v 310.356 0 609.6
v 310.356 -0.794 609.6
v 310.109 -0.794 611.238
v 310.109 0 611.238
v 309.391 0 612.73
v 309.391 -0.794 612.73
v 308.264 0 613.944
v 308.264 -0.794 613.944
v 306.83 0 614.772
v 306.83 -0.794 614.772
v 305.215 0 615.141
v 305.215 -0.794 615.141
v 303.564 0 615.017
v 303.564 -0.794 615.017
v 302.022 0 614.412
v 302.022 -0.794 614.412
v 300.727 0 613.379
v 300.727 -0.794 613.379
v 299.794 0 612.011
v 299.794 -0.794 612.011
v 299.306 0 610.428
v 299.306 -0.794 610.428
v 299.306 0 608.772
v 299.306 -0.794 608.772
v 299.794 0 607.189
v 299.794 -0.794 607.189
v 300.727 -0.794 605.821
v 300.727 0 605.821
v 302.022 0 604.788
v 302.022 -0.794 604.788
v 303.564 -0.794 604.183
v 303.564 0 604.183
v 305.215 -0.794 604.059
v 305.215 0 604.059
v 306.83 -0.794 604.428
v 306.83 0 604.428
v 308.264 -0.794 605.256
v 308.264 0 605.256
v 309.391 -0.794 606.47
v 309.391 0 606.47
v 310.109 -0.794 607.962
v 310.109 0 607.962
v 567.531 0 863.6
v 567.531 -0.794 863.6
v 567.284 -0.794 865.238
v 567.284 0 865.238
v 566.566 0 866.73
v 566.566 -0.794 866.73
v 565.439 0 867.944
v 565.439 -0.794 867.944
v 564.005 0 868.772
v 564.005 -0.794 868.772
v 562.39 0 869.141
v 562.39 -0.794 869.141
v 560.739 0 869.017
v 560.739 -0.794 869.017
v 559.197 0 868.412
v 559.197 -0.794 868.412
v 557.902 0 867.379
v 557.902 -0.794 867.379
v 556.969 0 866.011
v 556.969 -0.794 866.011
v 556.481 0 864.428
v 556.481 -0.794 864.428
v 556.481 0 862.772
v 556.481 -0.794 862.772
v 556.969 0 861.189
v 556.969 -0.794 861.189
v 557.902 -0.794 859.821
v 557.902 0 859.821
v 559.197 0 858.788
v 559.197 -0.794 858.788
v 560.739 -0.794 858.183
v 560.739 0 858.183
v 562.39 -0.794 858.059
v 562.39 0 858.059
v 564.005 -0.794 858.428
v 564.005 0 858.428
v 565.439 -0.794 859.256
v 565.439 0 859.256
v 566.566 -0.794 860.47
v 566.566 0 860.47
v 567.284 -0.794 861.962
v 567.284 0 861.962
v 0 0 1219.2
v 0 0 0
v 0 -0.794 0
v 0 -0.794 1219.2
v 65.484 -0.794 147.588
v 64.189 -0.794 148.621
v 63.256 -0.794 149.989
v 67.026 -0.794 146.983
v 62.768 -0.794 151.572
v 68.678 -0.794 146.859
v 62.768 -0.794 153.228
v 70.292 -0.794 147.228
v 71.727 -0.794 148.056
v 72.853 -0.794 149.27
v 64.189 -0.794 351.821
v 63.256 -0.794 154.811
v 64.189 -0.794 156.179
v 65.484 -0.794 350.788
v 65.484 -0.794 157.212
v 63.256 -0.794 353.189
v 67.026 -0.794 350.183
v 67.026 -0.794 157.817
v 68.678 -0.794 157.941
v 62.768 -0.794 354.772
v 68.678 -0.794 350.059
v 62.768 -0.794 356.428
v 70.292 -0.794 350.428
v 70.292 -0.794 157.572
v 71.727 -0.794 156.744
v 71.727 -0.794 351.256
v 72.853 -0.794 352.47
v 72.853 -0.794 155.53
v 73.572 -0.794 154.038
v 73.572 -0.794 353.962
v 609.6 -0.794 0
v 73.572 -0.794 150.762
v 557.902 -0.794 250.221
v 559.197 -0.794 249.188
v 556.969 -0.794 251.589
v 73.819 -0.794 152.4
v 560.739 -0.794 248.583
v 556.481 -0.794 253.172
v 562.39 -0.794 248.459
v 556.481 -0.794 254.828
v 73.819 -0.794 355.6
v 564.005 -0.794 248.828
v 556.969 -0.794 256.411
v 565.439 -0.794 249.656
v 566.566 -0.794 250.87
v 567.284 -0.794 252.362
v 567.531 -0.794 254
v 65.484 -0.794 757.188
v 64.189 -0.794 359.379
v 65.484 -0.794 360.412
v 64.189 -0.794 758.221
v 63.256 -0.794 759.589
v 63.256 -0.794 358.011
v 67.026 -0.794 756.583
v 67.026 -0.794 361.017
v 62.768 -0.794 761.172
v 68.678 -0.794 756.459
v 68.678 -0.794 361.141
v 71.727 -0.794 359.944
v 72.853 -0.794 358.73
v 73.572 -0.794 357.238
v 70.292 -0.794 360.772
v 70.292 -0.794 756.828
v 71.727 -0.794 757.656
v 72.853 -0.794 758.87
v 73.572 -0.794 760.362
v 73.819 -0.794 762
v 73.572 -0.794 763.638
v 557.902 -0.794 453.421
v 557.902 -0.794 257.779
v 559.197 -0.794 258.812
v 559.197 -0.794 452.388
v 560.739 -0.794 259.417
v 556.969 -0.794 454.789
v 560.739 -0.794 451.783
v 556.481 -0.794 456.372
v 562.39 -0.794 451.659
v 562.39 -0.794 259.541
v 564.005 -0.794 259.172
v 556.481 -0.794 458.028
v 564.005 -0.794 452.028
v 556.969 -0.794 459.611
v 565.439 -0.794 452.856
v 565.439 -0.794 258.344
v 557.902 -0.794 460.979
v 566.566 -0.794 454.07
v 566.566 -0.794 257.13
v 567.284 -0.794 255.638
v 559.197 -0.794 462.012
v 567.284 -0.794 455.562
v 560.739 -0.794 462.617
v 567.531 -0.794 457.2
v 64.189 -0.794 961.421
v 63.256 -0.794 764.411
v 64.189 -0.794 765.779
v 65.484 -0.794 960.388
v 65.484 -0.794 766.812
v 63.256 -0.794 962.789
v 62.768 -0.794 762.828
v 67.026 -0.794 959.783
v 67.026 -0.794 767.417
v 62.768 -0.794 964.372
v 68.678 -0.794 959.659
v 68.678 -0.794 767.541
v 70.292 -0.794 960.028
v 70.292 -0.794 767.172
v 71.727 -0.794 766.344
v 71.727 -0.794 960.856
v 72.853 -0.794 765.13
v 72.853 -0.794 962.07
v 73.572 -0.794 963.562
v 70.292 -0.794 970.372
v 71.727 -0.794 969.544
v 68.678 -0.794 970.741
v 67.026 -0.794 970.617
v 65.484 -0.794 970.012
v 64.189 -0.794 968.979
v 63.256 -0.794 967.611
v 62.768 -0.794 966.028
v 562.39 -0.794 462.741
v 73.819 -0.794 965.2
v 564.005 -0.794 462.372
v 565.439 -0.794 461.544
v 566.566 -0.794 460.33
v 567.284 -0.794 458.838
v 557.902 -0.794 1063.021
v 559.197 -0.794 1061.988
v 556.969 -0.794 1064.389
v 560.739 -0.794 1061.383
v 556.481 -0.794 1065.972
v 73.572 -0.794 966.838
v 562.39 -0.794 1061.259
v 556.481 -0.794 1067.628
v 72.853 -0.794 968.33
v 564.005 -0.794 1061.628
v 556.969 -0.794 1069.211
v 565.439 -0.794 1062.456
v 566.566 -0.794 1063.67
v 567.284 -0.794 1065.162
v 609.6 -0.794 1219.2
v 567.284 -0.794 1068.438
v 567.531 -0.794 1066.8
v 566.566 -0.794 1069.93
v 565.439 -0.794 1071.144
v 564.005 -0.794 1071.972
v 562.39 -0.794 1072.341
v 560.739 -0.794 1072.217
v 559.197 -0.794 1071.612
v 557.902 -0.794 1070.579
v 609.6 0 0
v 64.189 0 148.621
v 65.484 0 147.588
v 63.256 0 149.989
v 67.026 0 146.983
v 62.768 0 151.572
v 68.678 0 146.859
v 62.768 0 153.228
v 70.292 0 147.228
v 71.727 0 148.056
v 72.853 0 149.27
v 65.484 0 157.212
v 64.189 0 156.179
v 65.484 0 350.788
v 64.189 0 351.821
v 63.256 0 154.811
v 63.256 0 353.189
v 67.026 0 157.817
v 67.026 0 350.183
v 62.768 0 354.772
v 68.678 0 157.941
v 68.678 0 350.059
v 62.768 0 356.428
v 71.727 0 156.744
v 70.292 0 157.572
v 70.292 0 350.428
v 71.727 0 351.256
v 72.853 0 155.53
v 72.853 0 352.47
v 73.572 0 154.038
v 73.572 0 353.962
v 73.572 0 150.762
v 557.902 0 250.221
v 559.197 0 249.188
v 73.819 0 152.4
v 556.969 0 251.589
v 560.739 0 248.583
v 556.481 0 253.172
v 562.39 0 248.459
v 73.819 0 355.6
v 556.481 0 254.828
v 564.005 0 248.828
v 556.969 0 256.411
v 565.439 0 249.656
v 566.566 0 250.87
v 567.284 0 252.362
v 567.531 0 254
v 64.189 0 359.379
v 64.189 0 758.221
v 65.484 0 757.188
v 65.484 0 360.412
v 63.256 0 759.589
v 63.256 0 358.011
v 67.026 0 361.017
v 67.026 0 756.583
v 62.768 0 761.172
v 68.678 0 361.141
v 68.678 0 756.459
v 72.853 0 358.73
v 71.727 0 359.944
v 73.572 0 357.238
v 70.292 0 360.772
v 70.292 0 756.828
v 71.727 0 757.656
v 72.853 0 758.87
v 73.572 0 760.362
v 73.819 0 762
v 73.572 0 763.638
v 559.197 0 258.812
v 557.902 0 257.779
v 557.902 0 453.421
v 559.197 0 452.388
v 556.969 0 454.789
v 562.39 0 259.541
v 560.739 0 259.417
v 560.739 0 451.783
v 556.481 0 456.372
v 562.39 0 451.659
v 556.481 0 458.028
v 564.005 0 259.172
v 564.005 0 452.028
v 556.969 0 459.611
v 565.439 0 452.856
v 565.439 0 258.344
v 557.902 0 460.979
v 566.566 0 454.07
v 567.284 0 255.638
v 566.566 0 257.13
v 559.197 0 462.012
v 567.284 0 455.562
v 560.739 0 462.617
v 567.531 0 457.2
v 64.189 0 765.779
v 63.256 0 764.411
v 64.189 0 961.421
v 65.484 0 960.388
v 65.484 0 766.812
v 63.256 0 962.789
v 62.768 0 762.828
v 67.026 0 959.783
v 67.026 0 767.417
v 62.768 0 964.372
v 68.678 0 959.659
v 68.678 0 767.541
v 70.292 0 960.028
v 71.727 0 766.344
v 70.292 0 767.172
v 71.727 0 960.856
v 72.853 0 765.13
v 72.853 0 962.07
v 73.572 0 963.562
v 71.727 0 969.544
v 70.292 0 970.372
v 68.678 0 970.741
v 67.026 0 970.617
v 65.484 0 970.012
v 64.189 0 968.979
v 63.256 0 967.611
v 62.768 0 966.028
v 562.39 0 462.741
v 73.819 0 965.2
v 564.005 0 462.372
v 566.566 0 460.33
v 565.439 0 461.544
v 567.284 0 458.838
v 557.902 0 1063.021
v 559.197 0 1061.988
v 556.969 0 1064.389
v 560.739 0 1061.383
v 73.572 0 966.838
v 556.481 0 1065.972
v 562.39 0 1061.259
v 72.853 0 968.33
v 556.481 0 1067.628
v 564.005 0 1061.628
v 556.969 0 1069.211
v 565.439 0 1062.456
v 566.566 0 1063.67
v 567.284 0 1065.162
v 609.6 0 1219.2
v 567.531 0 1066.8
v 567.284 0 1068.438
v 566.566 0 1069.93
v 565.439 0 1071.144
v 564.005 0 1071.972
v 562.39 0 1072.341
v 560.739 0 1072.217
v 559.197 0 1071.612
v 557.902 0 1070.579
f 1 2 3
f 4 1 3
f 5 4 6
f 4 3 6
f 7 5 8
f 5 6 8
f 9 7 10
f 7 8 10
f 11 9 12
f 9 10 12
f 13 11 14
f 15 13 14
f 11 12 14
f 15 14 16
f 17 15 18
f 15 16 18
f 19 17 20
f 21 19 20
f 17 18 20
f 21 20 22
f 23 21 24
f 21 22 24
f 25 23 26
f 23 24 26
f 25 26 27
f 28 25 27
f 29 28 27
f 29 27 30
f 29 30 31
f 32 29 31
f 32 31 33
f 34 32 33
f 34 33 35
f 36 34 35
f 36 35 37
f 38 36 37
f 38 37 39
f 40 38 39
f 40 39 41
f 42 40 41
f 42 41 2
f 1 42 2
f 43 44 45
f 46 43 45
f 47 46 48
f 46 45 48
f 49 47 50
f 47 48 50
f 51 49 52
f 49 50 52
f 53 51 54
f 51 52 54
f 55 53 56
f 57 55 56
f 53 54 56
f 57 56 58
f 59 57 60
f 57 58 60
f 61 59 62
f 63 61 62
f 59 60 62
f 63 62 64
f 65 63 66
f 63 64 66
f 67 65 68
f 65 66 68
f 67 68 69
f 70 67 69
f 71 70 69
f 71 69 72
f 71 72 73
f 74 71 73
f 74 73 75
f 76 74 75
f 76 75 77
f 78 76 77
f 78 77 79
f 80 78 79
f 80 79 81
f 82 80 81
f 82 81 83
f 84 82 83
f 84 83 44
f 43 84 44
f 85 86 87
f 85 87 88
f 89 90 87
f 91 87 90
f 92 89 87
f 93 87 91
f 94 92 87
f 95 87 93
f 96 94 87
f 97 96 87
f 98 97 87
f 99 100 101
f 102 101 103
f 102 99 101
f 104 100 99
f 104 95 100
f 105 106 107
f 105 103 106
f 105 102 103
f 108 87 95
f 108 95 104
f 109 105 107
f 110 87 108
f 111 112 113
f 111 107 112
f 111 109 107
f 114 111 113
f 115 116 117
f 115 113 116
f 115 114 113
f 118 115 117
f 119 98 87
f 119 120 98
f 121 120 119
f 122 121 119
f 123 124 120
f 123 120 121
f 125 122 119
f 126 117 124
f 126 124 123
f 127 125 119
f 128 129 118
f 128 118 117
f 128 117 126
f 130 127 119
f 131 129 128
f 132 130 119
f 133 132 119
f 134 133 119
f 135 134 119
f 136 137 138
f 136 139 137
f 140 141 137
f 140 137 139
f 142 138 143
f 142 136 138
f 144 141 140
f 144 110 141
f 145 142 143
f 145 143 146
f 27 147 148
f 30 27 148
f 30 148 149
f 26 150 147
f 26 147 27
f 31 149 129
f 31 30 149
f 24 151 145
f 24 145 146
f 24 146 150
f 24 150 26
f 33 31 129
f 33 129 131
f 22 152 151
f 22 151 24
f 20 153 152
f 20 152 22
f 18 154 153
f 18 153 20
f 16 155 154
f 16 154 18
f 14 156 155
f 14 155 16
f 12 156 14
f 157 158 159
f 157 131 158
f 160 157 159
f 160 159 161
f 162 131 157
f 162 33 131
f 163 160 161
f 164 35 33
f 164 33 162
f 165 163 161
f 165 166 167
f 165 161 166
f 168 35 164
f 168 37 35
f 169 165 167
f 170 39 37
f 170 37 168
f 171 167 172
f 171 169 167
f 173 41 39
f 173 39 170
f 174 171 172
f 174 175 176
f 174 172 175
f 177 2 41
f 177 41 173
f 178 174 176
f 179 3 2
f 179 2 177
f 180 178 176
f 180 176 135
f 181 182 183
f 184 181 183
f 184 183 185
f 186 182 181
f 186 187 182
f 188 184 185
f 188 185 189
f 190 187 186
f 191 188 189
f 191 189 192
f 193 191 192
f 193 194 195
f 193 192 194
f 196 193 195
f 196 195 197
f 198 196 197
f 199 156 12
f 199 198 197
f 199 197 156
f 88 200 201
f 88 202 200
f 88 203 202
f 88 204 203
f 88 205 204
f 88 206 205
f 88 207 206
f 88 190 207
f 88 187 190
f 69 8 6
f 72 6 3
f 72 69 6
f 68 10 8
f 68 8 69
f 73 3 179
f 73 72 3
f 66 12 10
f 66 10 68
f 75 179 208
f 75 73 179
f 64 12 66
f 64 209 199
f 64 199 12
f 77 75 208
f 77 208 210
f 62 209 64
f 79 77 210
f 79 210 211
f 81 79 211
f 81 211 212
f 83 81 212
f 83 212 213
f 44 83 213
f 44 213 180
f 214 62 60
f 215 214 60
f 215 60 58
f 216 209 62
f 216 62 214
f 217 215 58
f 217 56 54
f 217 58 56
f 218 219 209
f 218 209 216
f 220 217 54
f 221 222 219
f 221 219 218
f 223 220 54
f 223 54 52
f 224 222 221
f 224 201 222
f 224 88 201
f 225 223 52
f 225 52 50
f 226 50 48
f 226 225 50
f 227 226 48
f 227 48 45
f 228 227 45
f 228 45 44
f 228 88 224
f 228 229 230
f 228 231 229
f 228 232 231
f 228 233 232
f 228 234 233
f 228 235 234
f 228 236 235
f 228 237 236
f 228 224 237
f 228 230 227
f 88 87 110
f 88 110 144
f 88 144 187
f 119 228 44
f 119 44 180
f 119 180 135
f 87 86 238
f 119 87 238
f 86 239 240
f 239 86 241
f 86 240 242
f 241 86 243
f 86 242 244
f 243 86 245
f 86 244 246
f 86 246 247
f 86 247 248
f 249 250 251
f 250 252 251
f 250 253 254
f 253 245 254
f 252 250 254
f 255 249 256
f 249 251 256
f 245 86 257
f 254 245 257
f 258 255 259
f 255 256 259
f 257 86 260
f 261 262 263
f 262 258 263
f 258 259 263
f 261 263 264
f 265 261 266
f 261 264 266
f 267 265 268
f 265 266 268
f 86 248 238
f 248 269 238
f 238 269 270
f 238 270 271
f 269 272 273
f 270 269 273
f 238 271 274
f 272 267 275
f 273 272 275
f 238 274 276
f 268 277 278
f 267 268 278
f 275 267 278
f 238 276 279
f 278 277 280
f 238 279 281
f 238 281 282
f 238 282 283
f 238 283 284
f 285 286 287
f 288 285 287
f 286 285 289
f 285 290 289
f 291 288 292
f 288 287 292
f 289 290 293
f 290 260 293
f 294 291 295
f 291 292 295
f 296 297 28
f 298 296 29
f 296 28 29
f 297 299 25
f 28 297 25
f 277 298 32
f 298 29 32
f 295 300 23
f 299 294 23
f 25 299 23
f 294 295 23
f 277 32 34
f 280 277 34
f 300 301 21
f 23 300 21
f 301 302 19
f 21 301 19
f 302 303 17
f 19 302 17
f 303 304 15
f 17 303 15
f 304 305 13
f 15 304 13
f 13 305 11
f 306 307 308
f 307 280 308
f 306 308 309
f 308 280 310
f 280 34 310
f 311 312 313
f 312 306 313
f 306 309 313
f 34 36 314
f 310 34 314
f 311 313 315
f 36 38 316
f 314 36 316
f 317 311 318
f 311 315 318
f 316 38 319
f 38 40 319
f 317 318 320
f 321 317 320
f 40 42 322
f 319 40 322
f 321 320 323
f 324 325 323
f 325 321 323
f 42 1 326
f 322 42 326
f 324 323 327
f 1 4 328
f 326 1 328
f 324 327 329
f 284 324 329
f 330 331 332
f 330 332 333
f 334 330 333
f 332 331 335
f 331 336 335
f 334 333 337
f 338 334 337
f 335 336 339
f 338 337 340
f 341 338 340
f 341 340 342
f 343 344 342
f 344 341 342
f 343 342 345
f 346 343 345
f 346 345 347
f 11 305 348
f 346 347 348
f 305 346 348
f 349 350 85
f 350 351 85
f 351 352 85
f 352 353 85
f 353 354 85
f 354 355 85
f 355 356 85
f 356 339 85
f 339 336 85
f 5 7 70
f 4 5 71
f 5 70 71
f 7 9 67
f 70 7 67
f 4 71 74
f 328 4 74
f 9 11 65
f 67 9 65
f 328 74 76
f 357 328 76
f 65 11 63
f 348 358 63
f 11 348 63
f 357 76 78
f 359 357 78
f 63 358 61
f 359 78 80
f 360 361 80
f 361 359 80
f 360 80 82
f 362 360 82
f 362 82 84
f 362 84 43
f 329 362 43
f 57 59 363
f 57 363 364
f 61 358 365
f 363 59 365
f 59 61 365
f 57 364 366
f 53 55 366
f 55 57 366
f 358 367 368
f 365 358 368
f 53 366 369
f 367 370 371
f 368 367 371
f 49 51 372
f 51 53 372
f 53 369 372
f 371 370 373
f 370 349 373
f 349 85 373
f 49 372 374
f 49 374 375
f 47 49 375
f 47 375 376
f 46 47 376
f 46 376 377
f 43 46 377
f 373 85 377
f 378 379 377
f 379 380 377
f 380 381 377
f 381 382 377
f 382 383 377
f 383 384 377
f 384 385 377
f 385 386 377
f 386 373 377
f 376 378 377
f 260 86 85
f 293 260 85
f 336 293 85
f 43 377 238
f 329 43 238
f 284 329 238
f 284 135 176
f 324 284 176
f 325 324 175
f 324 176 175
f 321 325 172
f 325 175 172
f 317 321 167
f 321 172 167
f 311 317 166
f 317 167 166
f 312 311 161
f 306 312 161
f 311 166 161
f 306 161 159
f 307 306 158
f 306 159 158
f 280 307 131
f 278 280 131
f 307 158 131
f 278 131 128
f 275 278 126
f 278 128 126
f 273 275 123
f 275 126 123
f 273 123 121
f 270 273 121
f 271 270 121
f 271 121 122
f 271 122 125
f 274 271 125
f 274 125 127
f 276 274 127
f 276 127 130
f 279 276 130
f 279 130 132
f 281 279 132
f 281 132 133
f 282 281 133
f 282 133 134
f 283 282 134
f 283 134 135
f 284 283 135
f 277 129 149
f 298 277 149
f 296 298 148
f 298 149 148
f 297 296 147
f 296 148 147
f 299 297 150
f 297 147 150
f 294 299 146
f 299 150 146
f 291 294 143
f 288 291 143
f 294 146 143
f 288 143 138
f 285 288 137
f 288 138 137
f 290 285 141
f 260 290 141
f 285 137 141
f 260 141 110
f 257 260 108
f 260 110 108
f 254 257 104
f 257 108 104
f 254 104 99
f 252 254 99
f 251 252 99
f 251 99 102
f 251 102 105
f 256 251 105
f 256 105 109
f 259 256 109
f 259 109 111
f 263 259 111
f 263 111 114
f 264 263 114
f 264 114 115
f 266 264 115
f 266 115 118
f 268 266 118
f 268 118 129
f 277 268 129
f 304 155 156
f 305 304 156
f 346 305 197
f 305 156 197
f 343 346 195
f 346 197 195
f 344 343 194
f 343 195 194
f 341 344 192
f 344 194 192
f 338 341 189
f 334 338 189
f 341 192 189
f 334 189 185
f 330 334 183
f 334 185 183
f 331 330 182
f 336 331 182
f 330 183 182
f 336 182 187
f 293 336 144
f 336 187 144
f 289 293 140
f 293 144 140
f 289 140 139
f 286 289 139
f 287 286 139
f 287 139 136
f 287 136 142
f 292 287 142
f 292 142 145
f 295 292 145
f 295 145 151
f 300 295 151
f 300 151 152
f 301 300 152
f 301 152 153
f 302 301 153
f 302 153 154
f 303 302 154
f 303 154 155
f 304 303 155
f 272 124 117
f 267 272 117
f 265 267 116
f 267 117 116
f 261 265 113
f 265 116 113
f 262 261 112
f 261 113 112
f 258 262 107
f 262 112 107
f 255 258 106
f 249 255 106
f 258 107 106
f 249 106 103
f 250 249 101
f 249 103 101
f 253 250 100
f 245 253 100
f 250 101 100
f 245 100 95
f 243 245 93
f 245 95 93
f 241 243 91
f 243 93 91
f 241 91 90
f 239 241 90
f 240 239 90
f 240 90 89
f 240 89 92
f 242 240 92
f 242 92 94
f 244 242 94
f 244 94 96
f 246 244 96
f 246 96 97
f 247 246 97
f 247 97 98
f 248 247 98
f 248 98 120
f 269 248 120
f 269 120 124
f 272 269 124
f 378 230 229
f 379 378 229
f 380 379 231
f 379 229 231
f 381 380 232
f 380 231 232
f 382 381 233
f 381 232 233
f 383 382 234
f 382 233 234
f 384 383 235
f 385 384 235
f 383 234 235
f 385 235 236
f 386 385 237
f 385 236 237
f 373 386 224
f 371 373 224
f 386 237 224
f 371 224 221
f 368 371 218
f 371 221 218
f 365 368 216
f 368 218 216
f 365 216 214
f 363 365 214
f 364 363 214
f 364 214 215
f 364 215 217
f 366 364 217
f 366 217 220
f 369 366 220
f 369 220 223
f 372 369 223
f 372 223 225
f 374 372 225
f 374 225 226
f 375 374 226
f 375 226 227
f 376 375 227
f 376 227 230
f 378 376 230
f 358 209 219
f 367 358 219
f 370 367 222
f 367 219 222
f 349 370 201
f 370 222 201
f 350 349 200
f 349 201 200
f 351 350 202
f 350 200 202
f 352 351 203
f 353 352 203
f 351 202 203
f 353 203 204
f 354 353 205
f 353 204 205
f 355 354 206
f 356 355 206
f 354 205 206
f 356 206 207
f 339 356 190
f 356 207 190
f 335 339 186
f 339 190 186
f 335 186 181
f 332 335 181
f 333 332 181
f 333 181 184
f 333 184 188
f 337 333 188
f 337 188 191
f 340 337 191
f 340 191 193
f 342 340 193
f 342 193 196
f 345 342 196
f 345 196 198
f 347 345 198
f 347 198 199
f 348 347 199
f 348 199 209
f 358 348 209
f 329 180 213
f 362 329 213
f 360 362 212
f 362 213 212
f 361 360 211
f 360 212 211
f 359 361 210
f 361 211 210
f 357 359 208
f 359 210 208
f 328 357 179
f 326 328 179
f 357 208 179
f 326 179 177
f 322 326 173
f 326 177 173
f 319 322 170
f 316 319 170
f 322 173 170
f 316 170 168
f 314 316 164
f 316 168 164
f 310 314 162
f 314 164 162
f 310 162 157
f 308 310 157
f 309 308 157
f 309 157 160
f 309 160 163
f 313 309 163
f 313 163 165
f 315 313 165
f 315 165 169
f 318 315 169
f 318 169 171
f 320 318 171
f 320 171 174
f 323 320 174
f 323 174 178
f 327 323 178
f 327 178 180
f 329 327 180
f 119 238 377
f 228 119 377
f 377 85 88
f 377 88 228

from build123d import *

# Parameters (mm, degrees)
F0_W     = 609.6
F0_H     = 1219.2
F1_DEPTH = 0.79375
F2_R     = 5.55625
F3_DEPTH = 25.4
F4_R     = 5.55625
F5_DEPTH = 25.4


# Not quite as in the source:
# - a feature names something its author has since deleted; it is built from what else it names


with BuildPart() as f1:
    # F0 (on Front) → F1 (new body)
    with BuildSketch(Plane.XZ):
        with Locations((304.8, 609.6)):
            Rectangle(F0_W, F0_H)
    extrude(amount=F1_DEPTH)

    # F2 (on face) → F3 (cut)
    with BuildSketch(Plane.XZ.offset(0.79375)):
        with Locations((68.2625, 152.4)):
            Circle(F2_R)
        with Locations((68.2625, 355.6)):
            Circle(F2_R)
        with Locations((561.975, 863.6)):
            Circle(F2_R)
        with Locations((561.975, 1066.8)):
            Circle(F2_R)
        with Locations((561.975, 254)):
            Circle(F2_R)
        with Locations((561.975, 457.2)):
            Circle(F2_R)
        with Locations((68.2625, 762)):
            Circle(F2_R)
        with Locations((68.2625, 965.2)):
            Circle(F2_R)
    extrude(amount=-F3_DEPTH, mode=Mode.SUBTRACT)

    # F4 (on face) → F5 (cut)
    with BuildSketch(Plane.XZ.offset(0.79375)):
        with Locations((304.8, 609.6)):
            Circle(F4_R)
    extrude(amount=-F5_DEPTH, mode=Mode.SUBTRACT)


solid = f1.part
